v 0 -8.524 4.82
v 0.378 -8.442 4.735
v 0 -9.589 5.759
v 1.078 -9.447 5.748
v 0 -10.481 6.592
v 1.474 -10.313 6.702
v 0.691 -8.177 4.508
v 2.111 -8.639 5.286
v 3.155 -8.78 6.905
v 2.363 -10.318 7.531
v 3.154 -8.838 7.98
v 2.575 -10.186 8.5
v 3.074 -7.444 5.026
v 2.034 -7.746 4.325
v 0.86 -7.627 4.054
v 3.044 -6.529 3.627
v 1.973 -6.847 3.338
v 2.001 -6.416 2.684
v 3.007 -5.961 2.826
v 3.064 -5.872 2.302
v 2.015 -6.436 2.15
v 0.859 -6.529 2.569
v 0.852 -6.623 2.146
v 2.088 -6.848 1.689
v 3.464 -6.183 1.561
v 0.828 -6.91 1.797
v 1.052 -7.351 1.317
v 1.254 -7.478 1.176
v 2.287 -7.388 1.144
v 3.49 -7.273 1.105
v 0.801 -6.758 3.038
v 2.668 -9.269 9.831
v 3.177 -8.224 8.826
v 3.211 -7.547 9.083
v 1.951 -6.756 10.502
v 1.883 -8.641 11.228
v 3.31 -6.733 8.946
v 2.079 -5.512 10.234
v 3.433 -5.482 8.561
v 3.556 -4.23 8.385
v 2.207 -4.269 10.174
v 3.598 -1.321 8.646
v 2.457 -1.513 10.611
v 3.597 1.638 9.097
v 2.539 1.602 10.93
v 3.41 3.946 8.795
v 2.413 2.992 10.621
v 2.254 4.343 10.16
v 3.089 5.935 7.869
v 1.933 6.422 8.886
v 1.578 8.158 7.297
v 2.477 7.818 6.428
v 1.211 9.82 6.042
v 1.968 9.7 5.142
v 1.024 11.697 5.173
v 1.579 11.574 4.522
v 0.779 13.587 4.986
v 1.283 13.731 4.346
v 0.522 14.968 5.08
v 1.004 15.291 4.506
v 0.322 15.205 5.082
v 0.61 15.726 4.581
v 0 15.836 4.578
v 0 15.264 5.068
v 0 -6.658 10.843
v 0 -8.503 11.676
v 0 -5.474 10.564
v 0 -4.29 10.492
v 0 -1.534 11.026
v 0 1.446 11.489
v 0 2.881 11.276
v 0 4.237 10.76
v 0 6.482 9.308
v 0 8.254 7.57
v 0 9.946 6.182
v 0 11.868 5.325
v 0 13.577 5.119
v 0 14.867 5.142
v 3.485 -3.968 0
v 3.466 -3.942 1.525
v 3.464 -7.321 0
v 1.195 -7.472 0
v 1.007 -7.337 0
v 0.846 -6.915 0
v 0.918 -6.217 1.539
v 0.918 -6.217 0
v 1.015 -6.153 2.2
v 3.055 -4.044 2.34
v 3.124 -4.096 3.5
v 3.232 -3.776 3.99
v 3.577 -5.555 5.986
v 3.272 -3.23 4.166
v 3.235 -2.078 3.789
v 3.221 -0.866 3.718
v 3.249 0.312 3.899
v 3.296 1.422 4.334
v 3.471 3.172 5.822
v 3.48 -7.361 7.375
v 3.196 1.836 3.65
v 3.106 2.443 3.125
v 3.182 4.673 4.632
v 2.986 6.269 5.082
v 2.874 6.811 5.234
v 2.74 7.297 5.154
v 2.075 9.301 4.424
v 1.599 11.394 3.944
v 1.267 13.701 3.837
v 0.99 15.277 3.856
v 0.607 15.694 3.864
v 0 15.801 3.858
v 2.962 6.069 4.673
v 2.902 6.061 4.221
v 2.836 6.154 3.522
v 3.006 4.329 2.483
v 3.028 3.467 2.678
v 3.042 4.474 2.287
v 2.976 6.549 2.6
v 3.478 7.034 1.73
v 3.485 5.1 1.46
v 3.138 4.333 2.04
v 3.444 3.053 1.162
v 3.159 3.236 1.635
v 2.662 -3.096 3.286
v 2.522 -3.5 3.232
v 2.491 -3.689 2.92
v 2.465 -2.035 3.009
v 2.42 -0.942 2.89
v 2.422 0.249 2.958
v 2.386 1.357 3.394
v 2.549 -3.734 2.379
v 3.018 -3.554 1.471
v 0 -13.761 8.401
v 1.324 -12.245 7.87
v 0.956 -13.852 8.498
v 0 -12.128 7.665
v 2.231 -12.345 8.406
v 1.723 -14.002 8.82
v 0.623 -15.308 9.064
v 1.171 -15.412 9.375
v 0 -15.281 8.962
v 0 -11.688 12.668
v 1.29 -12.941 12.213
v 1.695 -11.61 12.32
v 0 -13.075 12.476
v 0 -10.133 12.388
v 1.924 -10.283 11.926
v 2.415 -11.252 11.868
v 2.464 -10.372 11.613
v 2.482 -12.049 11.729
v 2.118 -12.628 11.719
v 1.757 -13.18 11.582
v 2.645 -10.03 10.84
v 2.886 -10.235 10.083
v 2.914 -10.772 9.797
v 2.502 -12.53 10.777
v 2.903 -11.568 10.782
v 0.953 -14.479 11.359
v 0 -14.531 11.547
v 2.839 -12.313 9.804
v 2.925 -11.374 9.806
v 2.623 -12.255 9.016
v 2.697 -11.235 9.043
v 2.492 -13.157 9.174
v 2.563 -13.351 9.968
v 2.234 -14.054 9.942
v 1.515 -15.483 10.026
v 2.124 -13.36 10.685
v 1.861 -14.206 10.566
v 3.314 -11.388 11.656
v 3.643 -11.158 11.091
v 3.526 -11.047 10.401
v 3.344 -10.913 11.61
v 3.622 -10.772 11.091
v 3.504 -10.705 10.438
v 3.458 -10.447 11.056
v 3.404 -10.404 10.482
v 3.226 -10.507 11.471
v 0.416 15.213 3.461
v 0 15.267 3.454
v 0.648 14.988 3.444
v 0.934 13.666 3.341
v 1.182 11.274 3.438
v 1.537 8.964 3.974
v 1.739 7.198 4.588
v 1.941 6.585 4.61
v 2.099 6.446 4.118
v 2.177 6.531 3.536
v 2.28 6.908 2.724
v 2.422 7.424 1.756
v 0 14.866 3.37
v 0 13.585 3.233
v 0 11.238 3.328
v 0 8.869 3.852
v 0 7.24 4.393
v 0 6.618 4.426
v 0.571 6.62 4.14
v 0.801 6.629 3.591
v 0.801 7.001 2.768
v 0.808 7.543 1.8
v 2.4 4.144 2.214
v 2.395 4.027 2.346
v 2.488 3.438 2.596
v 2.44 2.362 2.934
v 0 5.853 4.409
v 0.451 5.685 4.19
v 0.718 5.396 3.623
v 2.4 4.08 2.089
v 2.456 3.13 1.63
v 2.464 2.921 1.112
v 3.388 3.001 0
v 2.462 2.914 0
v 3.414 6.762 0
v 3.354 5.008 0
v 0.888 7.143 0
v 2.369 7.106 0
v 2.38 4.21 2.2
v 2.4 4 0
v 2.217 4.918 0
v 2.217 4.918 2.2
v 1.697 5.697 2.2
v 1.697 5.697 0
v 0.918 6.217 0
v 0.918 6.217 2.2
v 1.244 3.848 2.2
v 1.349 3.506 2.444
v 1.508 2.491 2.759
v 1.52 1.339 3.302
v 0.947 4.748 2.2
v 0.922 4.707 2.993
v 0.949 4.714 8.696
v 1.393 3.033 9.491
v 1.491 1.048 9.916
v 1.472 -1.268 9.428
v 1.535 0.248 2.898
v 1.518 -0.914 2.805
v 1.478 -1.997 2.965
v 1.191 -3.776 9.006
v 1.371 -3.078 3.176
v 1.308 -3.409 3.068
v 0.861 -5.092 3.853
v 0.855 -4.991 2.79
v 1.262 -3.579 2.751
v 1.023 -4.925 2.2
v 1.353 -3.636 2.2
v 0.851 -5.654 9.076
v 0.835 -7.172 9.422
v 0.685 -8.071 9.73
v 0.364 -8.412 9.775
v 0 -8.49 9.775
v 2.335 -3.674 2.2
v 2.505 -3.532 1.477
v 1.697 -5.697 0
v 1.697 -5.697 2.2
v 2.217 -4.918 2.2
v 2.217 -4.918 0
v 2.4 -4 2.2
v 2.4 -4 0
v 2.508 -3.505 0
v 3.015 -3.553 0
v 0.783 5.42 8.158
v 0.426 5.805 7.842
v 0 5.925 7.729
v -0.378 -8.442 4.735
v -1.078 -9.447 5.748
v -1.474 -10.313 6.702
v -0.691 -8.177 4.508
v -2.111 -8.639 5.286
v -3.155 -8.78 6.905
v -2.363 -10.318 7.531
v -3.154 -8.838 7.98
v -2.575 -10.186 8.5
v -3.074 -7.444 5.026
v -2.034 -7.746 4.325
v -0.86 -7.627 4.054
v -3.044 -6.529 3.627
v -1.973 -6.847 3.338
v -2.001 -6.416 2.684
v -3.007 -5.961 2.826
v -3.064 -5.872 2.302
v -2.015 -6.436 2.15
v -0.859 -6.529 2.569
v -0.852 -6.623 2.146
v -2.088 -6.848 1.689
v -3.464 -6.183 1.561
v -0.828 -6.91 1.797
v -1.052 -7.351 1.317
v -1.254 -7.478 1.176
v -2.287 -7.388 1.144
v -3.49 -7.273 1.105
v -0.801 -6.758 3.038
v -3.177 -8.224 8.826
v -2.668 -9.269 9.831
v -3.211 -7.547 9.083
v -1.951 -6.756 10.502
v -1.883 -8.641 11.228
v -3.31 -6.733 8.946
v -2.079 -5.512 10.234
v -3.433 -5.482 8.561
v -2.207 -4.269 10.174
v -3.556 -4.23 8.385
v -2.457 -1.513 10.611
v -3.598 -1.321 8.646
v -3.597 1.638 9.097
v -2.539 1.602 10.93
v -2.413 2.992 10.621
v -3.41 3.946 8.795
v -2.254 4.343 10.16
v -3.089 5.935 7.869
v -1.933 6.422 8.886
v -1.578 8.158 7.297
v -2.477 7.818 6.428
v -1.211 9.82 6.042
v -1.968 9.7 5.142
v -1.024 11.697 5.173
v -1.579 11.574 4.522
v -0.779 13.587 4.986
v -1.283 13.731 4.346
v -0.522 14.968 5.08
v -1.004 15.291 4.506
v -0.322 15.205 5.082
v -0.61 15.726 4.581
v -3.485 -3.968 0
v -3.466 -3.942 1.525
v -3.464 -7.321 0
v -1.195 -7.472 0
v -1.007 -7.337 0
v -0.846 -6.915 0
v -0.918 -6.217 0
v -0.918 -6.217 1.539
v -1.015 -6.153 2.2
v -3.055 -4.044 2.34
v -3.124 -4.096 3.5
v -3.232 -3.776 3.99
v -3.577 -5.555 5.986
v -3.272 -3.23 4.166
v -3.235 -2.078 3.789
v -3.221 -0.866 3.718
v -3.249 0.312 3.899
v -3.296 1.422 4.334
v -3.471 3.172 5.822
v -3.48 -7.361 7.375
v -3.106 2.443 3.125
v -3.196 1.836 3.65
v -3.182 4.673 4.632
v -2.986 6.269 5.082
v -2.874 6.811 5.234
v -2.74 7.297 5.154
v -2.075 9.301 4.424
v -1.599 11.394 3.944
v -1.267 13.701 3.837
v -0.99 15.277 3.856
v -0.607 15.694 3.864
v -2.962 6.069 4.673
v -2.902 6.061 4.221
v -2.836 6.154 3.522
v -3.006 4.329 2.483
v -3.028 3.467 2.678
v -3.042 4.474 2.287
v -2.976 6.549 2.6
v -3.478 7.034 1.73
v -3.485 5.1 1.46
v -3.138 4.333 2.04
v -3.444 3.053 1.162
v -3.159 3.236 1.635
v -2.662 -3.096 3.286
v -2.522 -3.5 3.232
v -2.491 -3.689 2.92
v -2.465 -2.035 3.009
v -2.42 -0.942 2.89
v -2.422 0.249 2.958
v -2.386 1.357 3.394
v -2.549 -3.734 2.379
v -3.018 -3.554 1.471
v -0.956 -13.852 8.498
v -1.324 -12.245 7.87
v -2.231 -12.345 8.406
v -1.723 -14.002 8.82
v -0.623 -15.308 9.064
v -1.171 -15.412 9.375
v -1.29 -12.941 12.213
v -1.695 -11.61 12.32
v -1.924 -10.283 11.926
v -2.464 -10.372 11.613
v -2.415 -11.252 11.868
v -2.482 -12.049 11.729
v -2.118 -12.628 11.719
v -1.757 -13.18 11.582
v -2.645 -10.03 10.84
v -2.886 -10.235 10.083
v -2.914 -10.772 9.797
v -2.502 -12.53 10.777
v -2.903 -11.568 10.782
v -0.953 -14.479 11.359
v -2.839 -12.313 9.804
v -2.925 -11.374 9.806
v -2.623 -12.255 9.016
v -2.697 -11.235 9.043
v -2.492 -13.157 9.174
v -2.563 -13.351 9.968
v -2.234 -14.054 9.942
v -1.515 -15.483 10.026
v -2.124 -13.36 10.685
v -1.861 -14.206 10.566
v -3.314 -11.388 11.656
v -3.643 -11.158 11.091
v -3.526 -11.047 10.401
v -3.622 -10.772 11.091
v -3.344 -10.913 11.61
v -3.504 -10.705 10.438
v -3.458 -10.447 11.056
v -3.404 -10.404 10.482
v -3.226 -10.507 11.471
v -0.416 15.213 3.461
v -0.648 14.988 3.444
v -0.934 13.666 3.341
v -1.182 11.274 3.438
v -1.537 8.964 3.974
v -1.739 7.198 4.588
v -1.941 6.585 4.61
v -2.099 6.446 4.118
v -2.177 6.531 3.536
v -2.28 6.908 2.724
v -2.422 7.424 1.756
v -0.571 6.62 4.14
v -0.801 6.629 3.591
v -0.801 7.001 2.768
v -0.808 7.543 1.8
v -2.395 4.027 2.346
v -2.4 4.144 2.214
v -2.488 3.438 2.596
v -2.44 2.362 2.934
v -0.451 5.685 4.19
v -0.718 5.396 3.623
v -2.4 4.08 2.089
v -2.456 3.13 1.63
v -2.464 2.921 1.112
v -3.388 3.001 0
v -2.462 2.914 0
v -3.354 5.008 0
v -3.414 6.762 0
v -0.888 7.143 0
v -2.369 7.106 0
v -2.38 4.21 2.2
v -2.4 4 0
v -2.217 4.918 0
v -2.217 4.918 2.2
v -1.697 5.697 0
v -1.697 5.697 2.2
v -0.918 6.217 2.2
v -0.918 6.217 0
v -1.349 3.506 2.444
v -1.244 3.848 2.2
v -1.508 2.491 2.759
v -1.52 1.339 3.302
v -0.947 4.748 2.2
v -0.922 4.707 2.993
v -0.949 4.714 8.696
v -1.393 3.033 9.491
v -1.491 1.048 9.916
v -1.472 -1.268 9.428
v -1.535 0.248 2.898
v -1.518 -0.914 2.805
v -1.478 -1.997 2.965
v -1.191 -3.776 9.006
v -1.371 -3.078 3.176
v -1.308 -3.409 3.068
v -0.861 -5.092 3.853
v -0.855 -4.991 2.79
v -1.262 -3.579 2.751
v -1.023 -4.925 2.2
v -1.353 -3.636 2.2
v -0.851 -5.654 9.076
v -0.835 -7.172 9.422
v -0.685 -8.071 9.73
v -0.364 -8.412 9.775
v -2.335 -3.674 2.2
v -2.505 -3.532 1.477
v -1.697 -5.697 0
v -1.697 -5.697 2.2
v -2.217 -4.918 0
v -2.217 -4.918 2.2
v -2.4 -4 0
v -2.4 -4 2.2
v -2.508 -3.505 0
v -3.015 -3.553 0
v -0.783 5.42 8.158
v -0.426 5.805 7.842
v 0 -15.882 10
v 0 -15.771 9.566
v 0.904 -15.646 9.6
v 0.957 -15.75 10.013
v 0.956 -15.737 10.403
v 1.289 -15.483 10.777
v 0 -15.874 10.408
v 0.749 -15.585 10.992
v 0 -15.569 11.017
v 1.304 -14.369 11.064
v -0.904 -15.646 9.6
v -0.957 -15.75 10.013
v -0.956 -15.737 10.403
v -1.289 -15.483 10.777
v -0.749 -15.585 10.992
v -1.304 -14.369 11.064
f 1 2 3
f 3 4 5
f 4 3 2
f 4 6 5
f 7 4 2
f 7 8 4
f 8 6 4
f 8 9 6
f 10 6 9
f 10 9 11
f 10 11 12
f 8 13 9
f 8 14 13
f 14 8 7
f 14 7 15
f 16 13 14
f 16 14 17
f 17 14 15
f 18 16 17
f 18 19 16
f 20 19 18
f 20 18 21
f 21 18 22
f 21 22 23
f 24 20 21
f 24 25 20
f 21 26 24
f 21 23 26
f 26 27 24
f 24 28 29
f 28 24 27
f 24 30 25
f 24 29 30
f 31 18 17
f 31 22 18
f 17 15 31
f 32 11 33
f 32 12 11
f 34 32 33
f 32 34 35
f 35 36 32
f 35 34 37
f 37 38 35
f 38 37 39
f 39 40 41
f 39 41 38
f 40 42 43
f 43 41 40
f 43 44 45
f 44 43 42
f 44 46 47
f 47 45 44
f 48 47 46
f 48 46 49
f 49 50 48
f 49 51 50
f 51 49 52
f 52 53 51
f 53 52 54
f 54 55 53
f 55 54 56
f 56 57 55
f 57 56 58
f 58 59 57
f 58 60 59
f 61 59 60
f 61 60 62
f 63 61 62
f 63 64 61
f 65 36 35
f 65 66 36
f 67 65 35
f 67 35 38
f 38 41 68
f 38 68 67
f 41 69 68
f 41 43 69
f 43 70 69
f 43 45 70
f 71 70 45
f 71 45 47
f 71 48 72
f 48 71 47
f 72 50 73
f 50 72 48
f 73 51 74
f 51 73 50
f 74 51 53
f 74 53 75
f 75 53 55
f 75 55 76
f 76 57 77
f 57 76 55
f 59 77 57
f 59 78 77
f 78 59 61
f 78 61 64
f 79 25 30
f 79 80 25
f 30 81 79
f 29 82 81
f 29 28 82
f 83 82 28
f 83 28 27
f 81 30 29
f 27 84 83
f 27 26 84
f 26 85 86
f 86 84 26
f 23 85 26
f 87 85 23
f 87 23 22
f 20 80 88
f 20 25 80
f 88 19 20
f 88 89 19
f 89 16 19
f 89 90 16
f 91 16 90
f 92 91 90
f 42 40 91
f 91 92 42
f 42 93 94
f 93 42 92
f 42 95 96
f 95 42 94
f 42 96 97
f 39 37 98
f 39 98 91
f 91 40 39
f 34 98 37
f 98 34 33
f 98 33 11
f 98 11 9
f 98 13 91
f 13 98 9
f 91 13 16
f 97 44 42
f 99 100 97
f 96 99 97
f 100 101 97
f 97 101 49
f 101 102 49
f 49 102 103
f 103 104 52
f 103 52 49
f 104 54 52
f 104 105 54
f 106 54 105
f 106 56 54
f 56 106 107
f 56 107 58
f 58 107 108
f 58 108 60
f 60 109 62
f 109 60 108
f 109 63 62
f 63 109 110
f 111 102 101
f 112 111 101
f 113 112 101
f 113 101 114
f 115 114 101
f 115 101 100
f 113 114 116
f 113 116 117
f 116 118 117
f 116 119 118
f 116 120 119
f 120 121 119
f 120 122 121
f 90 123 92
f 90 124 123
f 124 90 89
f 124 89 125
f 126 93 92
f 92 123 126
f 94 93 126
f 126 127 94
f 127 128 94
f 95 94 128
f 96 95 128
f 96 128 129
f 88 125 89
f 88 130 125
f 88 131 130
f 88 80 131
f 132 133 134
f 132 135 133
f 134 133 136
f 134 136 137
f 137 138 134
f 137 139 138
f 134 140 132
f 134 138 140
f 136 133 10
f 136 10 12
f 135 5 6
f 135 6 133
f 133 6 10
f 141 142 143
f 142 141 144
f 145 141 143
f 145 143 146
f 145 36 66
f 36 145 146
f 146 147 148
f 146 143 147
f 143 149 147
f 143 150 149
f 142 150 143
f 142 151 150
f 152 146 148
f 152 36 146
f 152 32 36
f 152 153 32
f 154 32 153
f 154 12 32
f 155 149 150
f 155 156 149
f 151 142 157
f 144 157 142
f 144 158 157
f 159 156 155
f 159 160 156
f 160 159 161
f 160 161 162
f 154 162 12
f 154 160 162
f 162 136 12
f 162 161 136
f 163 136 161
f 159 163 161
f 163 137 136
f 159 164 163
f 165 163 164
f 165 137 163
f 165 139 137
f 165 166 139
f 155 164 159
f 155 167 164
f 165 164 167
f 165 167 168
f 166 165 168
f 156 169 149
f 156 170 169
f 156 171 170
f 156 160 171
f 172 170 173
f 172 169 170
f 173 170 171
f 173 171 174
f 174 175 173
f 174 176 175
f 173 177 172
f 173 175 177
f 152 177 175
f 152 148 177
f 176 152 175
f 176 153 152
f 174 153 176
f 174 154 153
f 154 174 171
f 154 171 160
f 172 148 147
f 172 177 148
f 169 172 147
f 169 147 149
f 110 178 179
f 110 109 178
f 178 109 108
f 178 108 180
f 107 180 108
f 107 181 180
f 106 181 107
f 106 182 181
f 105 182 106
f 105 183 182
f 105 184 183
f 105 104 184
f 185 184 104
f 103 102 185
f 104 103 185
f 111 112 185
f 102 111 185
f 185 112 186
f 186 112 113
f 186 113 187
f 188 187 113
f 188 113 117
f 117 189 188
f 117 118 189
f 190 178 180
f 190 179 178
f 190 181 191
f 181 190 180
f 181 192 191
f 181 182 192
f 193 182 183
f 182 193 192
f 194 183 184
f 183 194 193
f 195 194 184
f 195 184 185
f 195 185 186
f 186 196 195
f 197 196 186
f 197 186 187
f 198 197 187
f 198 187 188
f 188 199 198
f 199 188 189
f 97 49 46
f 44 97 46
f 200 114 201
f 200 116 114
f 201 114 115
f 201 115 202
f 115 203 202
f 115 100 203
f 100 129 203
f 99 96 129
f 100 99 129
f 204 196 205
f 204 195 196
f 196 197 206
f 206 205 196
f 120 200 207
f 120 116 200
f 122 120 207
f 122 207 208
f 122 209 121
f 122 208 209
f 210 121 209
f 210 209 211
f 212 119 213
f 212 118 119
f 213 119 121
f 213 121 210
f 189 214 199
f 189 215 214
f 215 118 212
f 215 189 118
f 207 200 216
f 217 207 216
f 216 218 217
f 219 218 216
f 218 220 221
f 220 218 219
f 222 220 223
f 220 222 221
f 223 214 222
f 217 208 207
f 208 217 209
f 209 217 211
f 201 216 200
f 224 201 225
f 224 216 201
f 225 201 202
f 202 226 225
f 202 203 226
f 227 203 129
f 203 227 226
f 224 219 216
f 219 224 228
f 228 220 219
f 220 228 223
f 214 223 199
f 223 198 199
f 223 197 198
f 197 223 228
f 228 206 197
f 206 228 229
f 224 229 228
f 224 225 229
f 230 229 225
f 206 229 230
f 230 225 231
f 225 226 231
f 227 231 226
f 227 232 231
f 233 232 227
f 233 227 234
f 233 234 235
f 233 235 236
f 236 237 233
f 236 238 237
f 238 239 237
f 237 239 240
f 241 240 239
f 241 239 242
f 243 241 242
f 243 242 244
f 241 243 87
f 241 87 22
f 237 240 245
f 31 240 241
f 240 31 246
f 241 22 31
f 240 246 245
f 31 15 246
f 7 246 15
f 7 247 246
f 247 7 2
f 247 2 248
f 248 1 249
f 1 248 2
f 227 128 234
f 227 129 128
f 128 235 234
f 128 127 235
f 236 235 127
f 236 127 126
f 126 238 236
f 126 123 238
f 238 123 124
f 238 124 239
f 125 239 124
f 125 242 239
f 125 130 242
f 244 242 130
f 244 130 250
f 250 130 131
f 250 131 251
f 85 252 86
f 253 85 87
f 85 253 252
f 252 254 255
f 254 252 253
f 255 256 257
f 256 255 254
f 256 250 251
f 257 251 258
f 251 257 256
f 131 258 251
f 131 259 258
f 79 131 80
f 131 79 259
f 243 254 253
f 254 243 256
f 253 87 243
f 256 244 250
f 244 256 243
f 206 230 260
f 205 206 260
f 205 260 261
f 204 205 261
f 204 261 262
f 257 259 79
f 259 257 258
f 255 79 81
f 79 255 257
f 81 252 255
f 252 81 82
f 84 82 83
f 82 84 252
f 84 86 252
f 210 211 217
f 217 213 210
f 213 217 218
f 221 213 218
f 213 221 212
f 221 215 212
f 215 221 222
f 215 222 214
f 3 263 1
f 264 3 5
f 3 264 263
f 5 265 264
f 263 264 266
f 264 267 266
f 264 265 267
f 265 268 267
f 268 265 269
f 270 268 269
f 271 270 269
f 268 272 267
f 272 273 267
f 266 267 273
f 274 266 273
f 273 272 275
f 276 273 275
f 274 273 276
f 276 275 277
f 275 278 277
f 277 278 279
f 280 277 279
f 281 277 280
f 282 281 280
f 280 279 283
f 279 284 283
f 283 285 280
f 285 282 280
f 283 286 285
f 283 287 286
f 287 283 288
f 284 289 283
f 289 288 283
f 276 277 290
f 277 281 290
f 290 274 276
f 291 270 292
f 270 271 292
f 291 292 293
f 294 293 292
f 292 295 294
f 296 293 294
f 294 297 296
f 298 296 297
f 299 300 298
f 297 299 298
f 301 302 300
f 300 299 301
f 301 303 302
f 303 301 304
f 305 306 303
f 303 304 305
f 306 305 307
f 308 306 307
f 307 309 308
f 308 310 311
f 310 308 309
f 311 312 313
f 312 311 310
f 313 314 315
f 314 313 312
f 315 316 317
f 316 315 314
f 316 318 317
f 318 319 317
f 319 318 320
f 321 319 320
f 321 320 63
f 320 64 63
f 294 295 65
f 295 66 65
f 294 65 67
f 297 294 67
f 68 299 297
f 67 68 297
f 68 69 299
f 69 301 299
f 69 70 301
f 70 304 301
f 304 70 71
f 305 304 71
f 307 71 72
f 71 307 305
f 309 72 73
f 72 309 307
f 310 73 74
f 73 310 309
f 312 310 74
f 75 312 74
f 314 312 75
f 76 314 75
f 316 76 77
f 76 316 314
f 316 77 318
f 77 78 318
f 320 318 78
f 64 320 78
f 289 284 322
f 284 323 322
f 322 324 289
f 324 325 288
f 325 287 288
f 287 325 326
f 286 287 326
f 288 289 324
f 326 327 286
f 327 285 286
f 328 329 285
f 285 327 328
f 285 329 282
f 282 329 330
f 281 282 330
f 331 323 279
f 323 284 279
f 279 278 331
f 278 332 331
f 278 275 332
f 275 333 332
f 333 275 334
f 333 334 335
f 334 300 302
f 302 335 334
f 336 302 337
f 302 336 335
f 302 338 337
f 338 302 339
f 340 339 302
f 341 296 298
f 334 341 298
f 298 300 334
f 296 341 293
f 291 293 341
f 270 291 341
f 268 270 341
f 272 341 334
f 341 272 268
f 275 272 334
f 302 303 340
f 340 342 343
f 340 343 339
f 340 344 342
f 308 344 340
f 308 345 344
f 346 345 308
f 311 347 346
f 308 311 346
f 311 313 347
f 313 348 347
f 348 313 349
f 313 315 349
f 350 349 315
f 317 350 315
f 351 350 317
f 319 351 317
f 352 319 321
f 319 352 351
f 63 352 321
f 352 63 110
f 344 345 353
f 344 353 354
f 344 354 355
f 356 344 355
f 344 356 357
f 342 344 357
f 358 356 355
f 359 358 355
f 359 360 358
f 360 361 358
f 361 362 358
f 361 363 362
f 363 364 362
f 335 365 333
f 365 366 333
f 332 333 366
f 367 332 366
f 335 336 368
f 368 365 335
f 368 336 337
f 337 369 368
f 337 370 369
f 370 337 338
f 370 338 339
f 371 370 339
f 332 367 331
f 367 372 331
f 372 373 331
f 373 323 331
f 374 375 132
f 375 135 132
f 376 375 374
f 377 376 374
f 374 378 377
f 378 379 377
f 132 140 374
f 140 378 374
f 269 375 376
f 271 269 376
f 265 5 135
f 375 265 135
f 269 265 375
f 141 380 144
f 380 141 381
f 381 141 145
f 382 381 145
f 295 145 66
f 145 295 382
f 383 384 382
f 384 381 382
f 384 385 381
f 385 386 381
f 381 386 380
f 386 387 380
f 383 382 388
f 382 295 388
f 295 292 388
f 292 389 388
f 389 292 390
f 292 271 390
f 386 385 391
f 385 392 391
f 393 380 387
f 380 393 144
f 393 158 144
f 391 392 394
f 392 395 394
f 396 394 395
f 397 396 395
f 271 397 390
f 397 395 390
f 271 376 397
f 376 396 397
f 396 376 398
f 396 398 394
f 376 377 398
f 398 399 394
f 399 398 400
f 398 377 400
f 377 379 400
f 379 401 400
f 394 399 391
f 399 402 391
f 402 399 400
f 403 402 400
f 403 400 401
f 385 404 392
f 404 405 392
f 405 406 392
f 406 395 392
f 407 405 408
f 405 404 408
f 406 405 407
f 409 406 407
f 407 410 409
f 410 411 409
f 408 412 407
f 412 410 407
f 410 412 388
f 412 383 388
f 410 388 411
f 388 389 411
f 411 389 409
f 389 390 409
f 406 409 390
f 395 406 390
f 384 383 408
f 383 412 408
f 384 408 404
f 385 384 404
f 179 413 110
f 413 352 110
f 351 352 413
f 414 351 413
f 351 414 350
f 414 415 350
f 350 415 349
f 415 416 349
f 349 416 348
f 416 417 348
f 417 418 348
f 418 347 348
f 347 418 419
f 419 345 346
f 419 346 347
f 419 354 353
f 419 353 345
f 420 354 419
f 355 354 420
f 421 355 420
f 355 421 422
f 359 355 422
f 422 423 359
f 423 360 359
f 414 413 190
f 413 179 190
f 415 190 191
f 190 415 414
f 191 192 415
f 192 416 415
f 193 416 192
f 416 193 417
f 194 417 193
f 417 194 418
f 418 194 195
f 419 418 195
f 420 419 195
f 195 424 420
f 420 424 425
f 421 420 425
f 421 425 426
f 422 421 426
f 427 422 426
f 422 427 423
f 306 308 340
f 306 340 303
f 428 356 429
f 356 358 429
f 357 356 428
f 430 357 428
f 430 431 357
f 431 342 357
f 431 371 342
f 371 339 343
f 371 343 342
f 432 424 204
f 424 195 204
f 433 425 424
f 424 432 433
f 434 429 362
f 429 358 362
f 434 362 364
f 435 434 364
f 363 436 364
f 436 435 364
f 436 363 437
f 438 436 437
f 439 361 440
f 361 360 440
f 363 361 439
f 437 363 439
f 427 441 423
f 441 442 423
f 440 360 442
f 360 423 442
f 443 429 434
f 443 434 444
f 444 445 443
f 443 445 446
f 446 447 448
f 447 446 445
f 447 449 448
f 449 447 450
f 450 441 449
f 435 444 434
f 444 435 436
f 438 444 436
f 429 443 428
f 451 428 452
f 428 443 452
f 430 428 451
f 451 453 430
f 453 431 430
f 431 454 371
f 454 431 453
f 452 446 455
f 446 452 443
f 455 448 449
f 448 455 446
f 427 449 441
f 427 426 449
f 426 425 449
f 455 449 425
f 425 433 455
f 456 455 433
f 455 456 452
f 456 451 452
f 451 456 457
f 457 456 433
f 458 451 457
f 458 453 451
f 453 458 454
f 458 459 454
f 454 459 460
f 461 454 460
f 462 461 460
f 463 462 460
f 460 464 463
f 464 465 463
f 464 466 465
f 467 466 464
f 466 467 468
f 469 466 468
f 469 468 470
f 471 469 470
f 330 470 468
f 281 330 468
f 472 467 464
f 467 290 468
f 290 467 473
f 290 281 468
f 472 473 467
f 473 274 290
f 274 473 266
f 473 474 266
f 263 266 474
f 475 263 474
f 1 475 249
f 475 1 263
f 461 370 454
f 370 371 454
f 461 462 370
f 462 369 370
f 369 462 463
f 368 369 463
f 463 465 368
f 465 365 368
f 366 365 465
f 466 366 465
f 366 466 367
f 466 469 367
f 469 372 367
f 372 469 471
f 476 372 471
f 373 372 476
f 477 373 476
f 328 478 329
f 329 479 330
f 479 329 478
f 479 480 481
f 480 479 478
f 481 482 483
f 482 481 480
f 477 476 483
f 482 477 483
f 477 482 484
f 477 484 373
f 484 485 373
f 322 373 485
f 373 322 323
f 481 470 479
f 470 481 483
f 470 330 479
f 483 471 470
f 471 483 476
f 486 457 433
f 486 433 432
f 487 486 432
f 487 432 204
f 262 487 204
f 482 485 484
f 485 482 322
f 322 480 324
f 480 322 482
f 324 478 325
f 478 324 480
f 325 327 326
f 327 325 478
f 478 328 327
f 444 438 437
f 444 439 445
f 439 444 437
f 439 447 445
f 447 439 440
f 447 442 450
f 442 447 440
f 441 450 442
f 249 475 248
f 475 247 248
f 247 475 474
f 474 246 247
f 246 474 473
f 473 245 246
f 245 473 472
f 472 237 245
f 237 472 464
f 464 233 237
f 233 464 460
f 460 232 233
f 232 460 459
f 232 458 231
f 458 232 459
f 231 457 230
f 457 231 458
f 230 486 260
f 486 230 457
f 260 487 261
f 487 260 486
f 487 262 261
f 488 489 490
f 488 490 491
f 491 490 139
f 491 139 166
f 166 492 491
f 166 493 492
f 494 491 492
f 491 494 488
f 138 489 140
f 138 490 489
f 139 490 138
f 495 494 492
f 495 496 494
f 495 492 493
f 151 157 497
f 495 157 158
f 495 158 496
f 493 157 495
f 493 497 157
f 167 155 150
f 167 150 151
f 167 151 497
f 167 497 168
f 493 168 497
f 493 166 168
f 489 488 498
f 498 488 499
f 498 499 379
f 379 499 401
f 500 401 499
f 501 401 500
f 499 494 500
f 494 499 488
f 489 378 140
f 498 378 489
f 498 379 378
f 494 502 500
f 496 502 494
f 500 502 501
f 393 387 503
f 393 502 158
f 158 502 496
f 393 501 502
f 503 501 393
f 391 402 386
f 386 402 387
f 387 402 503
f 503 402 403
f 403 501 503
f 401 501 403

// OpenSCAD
use <../lib.scad>
use <s/67631s01.scad>
function ldraw_lib__67631() = [
// 0 Animal Otter
// 0 Name: 67631.dat
// 0 Author: Gerald Lasser [GeraldLasser]
// 0 !LDRAW_ORG Part UPDATE 2025-11
// 0 !LICENSE Licensed under CC BY 4.0 : see CAreadme.txt
// 
// 0 BFC CERTIFY CCW
  [0,"BFC","CERTIFY"],
  [0,"BFC","CCW"],
// 
// 0 !KEYWORDS Brickowl 828591
// 
// 0 !HISTORY 2023-02-04 {LEGO Instructions App} Original part shape
// 0 !HISTORY 2023-02-04 [GeraldLasser] File preparation for LDraw Parts Tracker
// 0 !HISTORY 2025-11-30 [OrionP] Official Update 2025-11
// 
// 1 16 0 0 0 1 0 0 0 1 0 0 0 1 s\67631s01.dat
  [1,16,0,0,0,1,0,0,0,1,0,0,0,1, ldraw_lib__s__67631s01()],
// 
// 3 16 0 -25 -39.704 0 -23.914 -39.428 2.259 -23.999 -39.114
  [3,16,0,-25,-39.704,0,-23.914,-39.428,2.259,-23.999,-39.114],
// 3 16 0 -25 -39.704 2.259 -23.999 -39.114 2.392 -25.032 -39.375
  [3,16,0,-25,-39.704,2.259,-23.999,-39.114,2.392,-25.032,-39.375],
// 3 16 2.392 -25.032 -39.375 2.259 -23.999 -39.114 2.928 -23.437 -38.53
  [3,16,2.392,-25.032,-39.375,2.259,-23.999,-39.114,2.928,-23.437,-38.53],
// 3 16 2.392 -25.032 -39.375 2.928 -23.437 -38.53 3.787 -25.064 -38.707
  [3,16,2.392,-25.032,-39.375,2.928,-23.437,-38.53,3.787,-25.064,-38.707],
// 3 16 3.787 -25.064 -38.707 2.391 -26.008 -39.343 2.392 -25.032 -39.375
  [3,16,3.787,-25.064,-38.707,2.391,-26.008,-39.343,2.392,-25.032,-39.375],
// 3 16 3.787 -25.064 -38.707 3.223 -26.943 -38.707 2.391 -26.008 -39.343
  [3,16,3.787,-25.064,-38.707,3.223,-26.943,-38.707,2.391,-26.008,-39.343],
// 4 16 2.391 -26.008 -39.343 0 -26.021 -39.686 0 -25 -39.704 2.392 -25.032 -39.375
  [4,16,2.391,-26.008,-39.343,0,-26.021,-39.686,0,-25,-39.704,2.392,-25.032,-39.375],
// 3 16 1.558 -22.661 -38.269 0 -23.914 -39.428 0 -22.405 -38.202
  [3,16,1.558,-22.661,-38.269,0,-23.914,-39.428,0,-22.405,-38.202],
// 3 16 1.558 -22.661 -38.269 2.259 -23.999 -39.114 0 -23.914 -39.428
  [3,16,1.558,-22.661,-38.269,2.259,-23.999,-39.114,0,-23.914,-39.428],
// 3 16 2.928 -23.437 -38.53 2.259 -23.999 -39.114 1.558 -22.661 -38.269
  [3,16,2.928,-23.437,-38.53,2.259,-23.999,-39.114,1.558,-22.661,-38.269],
// 3 16 1.872 -27.479 -38.962 0 -26.021 -39.686 2.391 -26.008 -39.343
  [3,16,1.872,-27.479,-38.962,0,-26.021,-39.686,2.391,-26.008,-39.343],
// 3 16 1.872 -27.479 -38.962 0 -27.542 -38.922 0 -26.021 -39.686
  [3,16,1.872,-27.479,-38.962,0,-27.542,-38.922,0,-26.021,-39.686],
// 3 16 1.872 -27.479 -38.962 2.391 -26.008 -39.343 3.223 -26.943 -38.707
  [3,16,1.872,-27.479,-38.962,2.391,-26.008,-39.343,3.223,-26.943,-38.707],
// 3 16 4.392 -28.955 -32.95 2.383 -28.397 -36.198 3.259 -27.66 -35.923
  [3,16,4.392,-28.955,-32.95,2.383,-28.397,-36.198,3.259,-27.66,-35.923],
// 3 16 1.872 -27.479 -38.962 2.383 -28.397 -36.198 0 -28.867 -36.328
  [3,16,1.872,-27.479,-38.962,2.383,-28.397,-36.198,0,-28.867,-36.328],
// 3 16 1.872 -27.479 -38.962 0 -28.867 -36.328 0 -27.542 -38.922
  [3,16,1.872,-27.479,-38.962,0,-28.867,-36.328,0,-27.542,-38.922],
// 3 16 3.223 -26.943 -38.707 2.383 -28.397 -36.198 1.872 -27.479 -38.962
  [3,16,3.223,-26.943,-38.707,2.383,-28.397,-36.198,1.872,-27.479,-38.962],
// 3 16 3.223 -26.943 -38.707 3.259 -27.66 -35.923 2.383 -28.397 -36.198
  [3,16,3.223,-26.943,-38.707,3.259,-27.66,-35.923,2.383,-28.397,-36.198],
// 3 16 5.31 -26.712 -33.4 6.255 -26.943 -31.326 5.294 -29.297 -31.571
  [3,16,5.31,-26.712,-33.4,6.255,-26.943,-31.326,5.294,-29.297,-31.571],
// 3 16 5.31 -26.712 -33.4 5.294 -29.297 -31.571 4.392 -28.955 -32.95
  [3,16,5.31,-26.712,-33.4,5.294,-29.297,-31.571,4.392,-28.955,-32.95],
// 3 16 5.31 -26.712 -33.4 4.392 -28.955 -32.95 3.259 -27.66 -35.923
  [3,16,5.31,-26.712,-33.4,4.392,-28.955,-32.95,3.259,-27.66,-35.923],
// 3 16 5.31 -26.712 -33.4 3.259 -27.66 -35.923 4.652 -26.416 -35.515
  [3,16,5.31,-26.712,-33.4,3.259,-27.66,-35.923,4.652,-26.416,-35.515],
// 3 16 3.223 -26.943 -38.707 4.652 -26.416 -35.515 3.259 -27.66 -35.923
  [3,16,3.223,-26.943,-38.707,4.652,-26.416,-35.515,3.259,-27.66,-35.923],
// 3 16 3.223 -26.943 -38.707 3.787 -25.064 -38.707 4.652 -26.416 -35.515
  [3,16,3.223,-26.943,-38.707,3.787,-25.064,-38.707,4.652,-26.416,-35.515],
// 
// 3 16 0 -23.914 -39.428 0 -25 -39.704 -2.259 -23.999 -39.114
  [3,16,0,-23.914,-39.428,0,-25,-39.704,-2.259,-23.999,-39.114],
// 3 16 -2.259 -23.999 -39.114 0 -25 -39.704 -2.392 -25.032 -39.375
  [3,16,-2.259,-23.999,-39.114,0,-25,-39.704,-2.392,-25.032,-39.375],
// 3 16 -2.259 -23.999 -39.114 -2.392 -25.032 -39.375 -2.928 -23.437 -38.53
  [3,16,-2.259,-23.999,-39.114,-2.392,-25.032,-39.375,-2.928,-23.437,-38.53],
// 3 16 -2.928 -23.437 -38.53 -2.392 -25.032 -39.375 -3.787 -25.064 -38.707
  [3,16,-2.928,-23.437,-38.53,-2.392,-25.032,-39.375,-3.787,-25.064,-38.707],
// 3 16 -2.391 -26.008 -39.343 -3.787 -25.064 -38.707 -2.392 -25.032 -39.375
  [3,16,-2.391,-26.008,-39.343,-3.787,-25.064,-38.707,-2.392,-25.032,-39.375],
// 3 16 -3.223 -26.943 -38.707 -3.787 -25.064 -38.707 -2.391 -26.008 -39.343
  [3,16,-3.223,-26.943,-38.707,-3.787,-25.064,-38.707,-2.391,-26.008,-39.343],
// 4 16 0 -25 -39.704 0 -26.021 -39.686 -2.391 -26.008 -39.343 -2.392 -25.032 -39.375
  [4,16,0,-25,-39.704,0,-26.021,-39.686,-2.391,-26.008,-39.343,-2.392,-25.032,-39.375],
// 3 16 0 -23.914 -39.428 -1.558 -22.661 -38.269 0 -22.405 -38.202
  [3,16,0,-23.914,-39.428,-1.558,-22.661,-38.269,0,-22.405,-38.202],
// 3 16 -2.259 -23.999 -39.114 -1.558 -22.661 -38.269 0 -23.914 -39.428
  [3,16,-2.259,-23.999,-39.114,-1.558,-22.661,-38.269,0,-23.914,-39.428],
// 3 16 -2.259 -23.999 -39.114 -2.928 -23.437 -38.53 -1.558 -22.661 -38.269
  [3,16,-2.259,-23.999,-39.114,-2.928,-23.437,-38.53,-1.558,-22.661,-38.269],
// 3 16 0 -26.021 -39.686 -1.872 -27.479 -38.962 -2.391 -26.008 -39.343
  [3,16,0,-26.021,-39.686,-1.872,-27.479,-38.962,-2.391,-26.008,-39.343],
// 3 16 0 -27.542 -38.922 -1.872 -27.479 -38.962 0 -26.021 -39.686
  [3,16,0,-27.542,-38.922,-1.872,-27.479,-38.962,0,-26.021,-39.686],
// 3 16 -2.391 -26.008 -39.343 -1.872 -27.479 -38.962 -3.223 -26.943 -38.707
  [3,16,-2.391,-26.008,-39.343,-1.872,-27.479,-38.962,-3.223,-26.943,-38.707],
// 3 16 -2.383 -28.397 -36.198 -4.392 -28.955 -32.95 -3.259 -27.66 -35.923
  [3,16,-2.383,-28.397,-36.198,-4.392,-28.955,-32.95,-3.259,-27.66,-35.923],
// 3 16 -2.383 -28.397 -36.198 -1.872 -27.479 -38.962 0 -28.867 -36.328
  [3,16,-2.383,-28.397,-36.198,-1.872,-27.479,-38.962,0,-28.867,-36.328],
// 3 16 0 -28.867 -36.328 -1.872 -27.479 -38.962 0 -27.542 -38.922
  [3,16,0,-28.867,-36.328,-1.872,-27.479,-38.962,0,-27.542,-38.922],
// 3 16 -2.383 -28.397 -36.198 -3.223 -26.943 -38.707 -1.872 -27.479 -38.962
  [3,16,-2.383,-28.397,-36.198,-3.223,-26.943,-38.707,-1.872,-27.479,-38.962],
// 3 16 -3.259 -27.66 -35.923 -3.223 -26.943 -38.707 -2.383 -28.397 -36.198
  [3,16,-3.259,-27.66,-35.923,-3.223,-26.943,-38.707,-2.383,-28.397,-36.198],
// 3 16 -6.255 -26.943 -31.326 -5.31 -26.712 -33.4 -5.294 -29.297 -31.571
  [3,16,-6.255,-26.943,-31.326,-5.31,-26.712,-33.4,-5.294,-29.297,-31.571],
// 3 16 -5.294 -29.297 -31.571 -5.31 -26.712 -33.4 -4.392 -28.955 -32.95
  [3,16,-5.294,-29.297,-31.571,-5.31,-26.712,-33.4,-4.392,-28.955,-32.95],
// 3 16 -4.392 -28.955 -32.95 -5.31 -26.712 -33.4 -3.259 -27.66 -35.923
  [3,16,-4.392,-28.955,-32.95,-5.31,-26.712,-33.4,-3.259,-27.66,-35.923],
// 3 16 -3.259 -27.66 -35.923 -5.31 -26.712 -33.4 -4.652 -26.416 -35.515
  [3,16,-3.259,-27.66,-35.923,-5.31,-26.712,-33.4,-4.652,-26.416,-35.515],
// 3 16 -4.652 -26.416 -35.515 -3.223 -26.943 -38.707 -3.259 -27.66 -35.923
  [3,16,-4.652,-26.416,-35.515,-3.223,-26.943,-38.707,-3.259,-27.66,-35.923],
// 3 16 -3.787 -25.064 -38.707 -3.223 -26.943 -38.707 -4.652 -26.416 -35.515
  [3,16,-3.787,-25.064,-38.707,-3.223,-26.943,-38.707,-4.652,-26.416,-35.515],
];
module ldraw_lib__67631(step=0, col=false, unit=2/5, alt=false, line=0.2, solid=!$preview)
    makepoly(ldraw_lib__67631(), step=step, col=col, unit=unit, alt=alt, line=line, solid=solid);
ldraw_lib__67631(line=0.2);
